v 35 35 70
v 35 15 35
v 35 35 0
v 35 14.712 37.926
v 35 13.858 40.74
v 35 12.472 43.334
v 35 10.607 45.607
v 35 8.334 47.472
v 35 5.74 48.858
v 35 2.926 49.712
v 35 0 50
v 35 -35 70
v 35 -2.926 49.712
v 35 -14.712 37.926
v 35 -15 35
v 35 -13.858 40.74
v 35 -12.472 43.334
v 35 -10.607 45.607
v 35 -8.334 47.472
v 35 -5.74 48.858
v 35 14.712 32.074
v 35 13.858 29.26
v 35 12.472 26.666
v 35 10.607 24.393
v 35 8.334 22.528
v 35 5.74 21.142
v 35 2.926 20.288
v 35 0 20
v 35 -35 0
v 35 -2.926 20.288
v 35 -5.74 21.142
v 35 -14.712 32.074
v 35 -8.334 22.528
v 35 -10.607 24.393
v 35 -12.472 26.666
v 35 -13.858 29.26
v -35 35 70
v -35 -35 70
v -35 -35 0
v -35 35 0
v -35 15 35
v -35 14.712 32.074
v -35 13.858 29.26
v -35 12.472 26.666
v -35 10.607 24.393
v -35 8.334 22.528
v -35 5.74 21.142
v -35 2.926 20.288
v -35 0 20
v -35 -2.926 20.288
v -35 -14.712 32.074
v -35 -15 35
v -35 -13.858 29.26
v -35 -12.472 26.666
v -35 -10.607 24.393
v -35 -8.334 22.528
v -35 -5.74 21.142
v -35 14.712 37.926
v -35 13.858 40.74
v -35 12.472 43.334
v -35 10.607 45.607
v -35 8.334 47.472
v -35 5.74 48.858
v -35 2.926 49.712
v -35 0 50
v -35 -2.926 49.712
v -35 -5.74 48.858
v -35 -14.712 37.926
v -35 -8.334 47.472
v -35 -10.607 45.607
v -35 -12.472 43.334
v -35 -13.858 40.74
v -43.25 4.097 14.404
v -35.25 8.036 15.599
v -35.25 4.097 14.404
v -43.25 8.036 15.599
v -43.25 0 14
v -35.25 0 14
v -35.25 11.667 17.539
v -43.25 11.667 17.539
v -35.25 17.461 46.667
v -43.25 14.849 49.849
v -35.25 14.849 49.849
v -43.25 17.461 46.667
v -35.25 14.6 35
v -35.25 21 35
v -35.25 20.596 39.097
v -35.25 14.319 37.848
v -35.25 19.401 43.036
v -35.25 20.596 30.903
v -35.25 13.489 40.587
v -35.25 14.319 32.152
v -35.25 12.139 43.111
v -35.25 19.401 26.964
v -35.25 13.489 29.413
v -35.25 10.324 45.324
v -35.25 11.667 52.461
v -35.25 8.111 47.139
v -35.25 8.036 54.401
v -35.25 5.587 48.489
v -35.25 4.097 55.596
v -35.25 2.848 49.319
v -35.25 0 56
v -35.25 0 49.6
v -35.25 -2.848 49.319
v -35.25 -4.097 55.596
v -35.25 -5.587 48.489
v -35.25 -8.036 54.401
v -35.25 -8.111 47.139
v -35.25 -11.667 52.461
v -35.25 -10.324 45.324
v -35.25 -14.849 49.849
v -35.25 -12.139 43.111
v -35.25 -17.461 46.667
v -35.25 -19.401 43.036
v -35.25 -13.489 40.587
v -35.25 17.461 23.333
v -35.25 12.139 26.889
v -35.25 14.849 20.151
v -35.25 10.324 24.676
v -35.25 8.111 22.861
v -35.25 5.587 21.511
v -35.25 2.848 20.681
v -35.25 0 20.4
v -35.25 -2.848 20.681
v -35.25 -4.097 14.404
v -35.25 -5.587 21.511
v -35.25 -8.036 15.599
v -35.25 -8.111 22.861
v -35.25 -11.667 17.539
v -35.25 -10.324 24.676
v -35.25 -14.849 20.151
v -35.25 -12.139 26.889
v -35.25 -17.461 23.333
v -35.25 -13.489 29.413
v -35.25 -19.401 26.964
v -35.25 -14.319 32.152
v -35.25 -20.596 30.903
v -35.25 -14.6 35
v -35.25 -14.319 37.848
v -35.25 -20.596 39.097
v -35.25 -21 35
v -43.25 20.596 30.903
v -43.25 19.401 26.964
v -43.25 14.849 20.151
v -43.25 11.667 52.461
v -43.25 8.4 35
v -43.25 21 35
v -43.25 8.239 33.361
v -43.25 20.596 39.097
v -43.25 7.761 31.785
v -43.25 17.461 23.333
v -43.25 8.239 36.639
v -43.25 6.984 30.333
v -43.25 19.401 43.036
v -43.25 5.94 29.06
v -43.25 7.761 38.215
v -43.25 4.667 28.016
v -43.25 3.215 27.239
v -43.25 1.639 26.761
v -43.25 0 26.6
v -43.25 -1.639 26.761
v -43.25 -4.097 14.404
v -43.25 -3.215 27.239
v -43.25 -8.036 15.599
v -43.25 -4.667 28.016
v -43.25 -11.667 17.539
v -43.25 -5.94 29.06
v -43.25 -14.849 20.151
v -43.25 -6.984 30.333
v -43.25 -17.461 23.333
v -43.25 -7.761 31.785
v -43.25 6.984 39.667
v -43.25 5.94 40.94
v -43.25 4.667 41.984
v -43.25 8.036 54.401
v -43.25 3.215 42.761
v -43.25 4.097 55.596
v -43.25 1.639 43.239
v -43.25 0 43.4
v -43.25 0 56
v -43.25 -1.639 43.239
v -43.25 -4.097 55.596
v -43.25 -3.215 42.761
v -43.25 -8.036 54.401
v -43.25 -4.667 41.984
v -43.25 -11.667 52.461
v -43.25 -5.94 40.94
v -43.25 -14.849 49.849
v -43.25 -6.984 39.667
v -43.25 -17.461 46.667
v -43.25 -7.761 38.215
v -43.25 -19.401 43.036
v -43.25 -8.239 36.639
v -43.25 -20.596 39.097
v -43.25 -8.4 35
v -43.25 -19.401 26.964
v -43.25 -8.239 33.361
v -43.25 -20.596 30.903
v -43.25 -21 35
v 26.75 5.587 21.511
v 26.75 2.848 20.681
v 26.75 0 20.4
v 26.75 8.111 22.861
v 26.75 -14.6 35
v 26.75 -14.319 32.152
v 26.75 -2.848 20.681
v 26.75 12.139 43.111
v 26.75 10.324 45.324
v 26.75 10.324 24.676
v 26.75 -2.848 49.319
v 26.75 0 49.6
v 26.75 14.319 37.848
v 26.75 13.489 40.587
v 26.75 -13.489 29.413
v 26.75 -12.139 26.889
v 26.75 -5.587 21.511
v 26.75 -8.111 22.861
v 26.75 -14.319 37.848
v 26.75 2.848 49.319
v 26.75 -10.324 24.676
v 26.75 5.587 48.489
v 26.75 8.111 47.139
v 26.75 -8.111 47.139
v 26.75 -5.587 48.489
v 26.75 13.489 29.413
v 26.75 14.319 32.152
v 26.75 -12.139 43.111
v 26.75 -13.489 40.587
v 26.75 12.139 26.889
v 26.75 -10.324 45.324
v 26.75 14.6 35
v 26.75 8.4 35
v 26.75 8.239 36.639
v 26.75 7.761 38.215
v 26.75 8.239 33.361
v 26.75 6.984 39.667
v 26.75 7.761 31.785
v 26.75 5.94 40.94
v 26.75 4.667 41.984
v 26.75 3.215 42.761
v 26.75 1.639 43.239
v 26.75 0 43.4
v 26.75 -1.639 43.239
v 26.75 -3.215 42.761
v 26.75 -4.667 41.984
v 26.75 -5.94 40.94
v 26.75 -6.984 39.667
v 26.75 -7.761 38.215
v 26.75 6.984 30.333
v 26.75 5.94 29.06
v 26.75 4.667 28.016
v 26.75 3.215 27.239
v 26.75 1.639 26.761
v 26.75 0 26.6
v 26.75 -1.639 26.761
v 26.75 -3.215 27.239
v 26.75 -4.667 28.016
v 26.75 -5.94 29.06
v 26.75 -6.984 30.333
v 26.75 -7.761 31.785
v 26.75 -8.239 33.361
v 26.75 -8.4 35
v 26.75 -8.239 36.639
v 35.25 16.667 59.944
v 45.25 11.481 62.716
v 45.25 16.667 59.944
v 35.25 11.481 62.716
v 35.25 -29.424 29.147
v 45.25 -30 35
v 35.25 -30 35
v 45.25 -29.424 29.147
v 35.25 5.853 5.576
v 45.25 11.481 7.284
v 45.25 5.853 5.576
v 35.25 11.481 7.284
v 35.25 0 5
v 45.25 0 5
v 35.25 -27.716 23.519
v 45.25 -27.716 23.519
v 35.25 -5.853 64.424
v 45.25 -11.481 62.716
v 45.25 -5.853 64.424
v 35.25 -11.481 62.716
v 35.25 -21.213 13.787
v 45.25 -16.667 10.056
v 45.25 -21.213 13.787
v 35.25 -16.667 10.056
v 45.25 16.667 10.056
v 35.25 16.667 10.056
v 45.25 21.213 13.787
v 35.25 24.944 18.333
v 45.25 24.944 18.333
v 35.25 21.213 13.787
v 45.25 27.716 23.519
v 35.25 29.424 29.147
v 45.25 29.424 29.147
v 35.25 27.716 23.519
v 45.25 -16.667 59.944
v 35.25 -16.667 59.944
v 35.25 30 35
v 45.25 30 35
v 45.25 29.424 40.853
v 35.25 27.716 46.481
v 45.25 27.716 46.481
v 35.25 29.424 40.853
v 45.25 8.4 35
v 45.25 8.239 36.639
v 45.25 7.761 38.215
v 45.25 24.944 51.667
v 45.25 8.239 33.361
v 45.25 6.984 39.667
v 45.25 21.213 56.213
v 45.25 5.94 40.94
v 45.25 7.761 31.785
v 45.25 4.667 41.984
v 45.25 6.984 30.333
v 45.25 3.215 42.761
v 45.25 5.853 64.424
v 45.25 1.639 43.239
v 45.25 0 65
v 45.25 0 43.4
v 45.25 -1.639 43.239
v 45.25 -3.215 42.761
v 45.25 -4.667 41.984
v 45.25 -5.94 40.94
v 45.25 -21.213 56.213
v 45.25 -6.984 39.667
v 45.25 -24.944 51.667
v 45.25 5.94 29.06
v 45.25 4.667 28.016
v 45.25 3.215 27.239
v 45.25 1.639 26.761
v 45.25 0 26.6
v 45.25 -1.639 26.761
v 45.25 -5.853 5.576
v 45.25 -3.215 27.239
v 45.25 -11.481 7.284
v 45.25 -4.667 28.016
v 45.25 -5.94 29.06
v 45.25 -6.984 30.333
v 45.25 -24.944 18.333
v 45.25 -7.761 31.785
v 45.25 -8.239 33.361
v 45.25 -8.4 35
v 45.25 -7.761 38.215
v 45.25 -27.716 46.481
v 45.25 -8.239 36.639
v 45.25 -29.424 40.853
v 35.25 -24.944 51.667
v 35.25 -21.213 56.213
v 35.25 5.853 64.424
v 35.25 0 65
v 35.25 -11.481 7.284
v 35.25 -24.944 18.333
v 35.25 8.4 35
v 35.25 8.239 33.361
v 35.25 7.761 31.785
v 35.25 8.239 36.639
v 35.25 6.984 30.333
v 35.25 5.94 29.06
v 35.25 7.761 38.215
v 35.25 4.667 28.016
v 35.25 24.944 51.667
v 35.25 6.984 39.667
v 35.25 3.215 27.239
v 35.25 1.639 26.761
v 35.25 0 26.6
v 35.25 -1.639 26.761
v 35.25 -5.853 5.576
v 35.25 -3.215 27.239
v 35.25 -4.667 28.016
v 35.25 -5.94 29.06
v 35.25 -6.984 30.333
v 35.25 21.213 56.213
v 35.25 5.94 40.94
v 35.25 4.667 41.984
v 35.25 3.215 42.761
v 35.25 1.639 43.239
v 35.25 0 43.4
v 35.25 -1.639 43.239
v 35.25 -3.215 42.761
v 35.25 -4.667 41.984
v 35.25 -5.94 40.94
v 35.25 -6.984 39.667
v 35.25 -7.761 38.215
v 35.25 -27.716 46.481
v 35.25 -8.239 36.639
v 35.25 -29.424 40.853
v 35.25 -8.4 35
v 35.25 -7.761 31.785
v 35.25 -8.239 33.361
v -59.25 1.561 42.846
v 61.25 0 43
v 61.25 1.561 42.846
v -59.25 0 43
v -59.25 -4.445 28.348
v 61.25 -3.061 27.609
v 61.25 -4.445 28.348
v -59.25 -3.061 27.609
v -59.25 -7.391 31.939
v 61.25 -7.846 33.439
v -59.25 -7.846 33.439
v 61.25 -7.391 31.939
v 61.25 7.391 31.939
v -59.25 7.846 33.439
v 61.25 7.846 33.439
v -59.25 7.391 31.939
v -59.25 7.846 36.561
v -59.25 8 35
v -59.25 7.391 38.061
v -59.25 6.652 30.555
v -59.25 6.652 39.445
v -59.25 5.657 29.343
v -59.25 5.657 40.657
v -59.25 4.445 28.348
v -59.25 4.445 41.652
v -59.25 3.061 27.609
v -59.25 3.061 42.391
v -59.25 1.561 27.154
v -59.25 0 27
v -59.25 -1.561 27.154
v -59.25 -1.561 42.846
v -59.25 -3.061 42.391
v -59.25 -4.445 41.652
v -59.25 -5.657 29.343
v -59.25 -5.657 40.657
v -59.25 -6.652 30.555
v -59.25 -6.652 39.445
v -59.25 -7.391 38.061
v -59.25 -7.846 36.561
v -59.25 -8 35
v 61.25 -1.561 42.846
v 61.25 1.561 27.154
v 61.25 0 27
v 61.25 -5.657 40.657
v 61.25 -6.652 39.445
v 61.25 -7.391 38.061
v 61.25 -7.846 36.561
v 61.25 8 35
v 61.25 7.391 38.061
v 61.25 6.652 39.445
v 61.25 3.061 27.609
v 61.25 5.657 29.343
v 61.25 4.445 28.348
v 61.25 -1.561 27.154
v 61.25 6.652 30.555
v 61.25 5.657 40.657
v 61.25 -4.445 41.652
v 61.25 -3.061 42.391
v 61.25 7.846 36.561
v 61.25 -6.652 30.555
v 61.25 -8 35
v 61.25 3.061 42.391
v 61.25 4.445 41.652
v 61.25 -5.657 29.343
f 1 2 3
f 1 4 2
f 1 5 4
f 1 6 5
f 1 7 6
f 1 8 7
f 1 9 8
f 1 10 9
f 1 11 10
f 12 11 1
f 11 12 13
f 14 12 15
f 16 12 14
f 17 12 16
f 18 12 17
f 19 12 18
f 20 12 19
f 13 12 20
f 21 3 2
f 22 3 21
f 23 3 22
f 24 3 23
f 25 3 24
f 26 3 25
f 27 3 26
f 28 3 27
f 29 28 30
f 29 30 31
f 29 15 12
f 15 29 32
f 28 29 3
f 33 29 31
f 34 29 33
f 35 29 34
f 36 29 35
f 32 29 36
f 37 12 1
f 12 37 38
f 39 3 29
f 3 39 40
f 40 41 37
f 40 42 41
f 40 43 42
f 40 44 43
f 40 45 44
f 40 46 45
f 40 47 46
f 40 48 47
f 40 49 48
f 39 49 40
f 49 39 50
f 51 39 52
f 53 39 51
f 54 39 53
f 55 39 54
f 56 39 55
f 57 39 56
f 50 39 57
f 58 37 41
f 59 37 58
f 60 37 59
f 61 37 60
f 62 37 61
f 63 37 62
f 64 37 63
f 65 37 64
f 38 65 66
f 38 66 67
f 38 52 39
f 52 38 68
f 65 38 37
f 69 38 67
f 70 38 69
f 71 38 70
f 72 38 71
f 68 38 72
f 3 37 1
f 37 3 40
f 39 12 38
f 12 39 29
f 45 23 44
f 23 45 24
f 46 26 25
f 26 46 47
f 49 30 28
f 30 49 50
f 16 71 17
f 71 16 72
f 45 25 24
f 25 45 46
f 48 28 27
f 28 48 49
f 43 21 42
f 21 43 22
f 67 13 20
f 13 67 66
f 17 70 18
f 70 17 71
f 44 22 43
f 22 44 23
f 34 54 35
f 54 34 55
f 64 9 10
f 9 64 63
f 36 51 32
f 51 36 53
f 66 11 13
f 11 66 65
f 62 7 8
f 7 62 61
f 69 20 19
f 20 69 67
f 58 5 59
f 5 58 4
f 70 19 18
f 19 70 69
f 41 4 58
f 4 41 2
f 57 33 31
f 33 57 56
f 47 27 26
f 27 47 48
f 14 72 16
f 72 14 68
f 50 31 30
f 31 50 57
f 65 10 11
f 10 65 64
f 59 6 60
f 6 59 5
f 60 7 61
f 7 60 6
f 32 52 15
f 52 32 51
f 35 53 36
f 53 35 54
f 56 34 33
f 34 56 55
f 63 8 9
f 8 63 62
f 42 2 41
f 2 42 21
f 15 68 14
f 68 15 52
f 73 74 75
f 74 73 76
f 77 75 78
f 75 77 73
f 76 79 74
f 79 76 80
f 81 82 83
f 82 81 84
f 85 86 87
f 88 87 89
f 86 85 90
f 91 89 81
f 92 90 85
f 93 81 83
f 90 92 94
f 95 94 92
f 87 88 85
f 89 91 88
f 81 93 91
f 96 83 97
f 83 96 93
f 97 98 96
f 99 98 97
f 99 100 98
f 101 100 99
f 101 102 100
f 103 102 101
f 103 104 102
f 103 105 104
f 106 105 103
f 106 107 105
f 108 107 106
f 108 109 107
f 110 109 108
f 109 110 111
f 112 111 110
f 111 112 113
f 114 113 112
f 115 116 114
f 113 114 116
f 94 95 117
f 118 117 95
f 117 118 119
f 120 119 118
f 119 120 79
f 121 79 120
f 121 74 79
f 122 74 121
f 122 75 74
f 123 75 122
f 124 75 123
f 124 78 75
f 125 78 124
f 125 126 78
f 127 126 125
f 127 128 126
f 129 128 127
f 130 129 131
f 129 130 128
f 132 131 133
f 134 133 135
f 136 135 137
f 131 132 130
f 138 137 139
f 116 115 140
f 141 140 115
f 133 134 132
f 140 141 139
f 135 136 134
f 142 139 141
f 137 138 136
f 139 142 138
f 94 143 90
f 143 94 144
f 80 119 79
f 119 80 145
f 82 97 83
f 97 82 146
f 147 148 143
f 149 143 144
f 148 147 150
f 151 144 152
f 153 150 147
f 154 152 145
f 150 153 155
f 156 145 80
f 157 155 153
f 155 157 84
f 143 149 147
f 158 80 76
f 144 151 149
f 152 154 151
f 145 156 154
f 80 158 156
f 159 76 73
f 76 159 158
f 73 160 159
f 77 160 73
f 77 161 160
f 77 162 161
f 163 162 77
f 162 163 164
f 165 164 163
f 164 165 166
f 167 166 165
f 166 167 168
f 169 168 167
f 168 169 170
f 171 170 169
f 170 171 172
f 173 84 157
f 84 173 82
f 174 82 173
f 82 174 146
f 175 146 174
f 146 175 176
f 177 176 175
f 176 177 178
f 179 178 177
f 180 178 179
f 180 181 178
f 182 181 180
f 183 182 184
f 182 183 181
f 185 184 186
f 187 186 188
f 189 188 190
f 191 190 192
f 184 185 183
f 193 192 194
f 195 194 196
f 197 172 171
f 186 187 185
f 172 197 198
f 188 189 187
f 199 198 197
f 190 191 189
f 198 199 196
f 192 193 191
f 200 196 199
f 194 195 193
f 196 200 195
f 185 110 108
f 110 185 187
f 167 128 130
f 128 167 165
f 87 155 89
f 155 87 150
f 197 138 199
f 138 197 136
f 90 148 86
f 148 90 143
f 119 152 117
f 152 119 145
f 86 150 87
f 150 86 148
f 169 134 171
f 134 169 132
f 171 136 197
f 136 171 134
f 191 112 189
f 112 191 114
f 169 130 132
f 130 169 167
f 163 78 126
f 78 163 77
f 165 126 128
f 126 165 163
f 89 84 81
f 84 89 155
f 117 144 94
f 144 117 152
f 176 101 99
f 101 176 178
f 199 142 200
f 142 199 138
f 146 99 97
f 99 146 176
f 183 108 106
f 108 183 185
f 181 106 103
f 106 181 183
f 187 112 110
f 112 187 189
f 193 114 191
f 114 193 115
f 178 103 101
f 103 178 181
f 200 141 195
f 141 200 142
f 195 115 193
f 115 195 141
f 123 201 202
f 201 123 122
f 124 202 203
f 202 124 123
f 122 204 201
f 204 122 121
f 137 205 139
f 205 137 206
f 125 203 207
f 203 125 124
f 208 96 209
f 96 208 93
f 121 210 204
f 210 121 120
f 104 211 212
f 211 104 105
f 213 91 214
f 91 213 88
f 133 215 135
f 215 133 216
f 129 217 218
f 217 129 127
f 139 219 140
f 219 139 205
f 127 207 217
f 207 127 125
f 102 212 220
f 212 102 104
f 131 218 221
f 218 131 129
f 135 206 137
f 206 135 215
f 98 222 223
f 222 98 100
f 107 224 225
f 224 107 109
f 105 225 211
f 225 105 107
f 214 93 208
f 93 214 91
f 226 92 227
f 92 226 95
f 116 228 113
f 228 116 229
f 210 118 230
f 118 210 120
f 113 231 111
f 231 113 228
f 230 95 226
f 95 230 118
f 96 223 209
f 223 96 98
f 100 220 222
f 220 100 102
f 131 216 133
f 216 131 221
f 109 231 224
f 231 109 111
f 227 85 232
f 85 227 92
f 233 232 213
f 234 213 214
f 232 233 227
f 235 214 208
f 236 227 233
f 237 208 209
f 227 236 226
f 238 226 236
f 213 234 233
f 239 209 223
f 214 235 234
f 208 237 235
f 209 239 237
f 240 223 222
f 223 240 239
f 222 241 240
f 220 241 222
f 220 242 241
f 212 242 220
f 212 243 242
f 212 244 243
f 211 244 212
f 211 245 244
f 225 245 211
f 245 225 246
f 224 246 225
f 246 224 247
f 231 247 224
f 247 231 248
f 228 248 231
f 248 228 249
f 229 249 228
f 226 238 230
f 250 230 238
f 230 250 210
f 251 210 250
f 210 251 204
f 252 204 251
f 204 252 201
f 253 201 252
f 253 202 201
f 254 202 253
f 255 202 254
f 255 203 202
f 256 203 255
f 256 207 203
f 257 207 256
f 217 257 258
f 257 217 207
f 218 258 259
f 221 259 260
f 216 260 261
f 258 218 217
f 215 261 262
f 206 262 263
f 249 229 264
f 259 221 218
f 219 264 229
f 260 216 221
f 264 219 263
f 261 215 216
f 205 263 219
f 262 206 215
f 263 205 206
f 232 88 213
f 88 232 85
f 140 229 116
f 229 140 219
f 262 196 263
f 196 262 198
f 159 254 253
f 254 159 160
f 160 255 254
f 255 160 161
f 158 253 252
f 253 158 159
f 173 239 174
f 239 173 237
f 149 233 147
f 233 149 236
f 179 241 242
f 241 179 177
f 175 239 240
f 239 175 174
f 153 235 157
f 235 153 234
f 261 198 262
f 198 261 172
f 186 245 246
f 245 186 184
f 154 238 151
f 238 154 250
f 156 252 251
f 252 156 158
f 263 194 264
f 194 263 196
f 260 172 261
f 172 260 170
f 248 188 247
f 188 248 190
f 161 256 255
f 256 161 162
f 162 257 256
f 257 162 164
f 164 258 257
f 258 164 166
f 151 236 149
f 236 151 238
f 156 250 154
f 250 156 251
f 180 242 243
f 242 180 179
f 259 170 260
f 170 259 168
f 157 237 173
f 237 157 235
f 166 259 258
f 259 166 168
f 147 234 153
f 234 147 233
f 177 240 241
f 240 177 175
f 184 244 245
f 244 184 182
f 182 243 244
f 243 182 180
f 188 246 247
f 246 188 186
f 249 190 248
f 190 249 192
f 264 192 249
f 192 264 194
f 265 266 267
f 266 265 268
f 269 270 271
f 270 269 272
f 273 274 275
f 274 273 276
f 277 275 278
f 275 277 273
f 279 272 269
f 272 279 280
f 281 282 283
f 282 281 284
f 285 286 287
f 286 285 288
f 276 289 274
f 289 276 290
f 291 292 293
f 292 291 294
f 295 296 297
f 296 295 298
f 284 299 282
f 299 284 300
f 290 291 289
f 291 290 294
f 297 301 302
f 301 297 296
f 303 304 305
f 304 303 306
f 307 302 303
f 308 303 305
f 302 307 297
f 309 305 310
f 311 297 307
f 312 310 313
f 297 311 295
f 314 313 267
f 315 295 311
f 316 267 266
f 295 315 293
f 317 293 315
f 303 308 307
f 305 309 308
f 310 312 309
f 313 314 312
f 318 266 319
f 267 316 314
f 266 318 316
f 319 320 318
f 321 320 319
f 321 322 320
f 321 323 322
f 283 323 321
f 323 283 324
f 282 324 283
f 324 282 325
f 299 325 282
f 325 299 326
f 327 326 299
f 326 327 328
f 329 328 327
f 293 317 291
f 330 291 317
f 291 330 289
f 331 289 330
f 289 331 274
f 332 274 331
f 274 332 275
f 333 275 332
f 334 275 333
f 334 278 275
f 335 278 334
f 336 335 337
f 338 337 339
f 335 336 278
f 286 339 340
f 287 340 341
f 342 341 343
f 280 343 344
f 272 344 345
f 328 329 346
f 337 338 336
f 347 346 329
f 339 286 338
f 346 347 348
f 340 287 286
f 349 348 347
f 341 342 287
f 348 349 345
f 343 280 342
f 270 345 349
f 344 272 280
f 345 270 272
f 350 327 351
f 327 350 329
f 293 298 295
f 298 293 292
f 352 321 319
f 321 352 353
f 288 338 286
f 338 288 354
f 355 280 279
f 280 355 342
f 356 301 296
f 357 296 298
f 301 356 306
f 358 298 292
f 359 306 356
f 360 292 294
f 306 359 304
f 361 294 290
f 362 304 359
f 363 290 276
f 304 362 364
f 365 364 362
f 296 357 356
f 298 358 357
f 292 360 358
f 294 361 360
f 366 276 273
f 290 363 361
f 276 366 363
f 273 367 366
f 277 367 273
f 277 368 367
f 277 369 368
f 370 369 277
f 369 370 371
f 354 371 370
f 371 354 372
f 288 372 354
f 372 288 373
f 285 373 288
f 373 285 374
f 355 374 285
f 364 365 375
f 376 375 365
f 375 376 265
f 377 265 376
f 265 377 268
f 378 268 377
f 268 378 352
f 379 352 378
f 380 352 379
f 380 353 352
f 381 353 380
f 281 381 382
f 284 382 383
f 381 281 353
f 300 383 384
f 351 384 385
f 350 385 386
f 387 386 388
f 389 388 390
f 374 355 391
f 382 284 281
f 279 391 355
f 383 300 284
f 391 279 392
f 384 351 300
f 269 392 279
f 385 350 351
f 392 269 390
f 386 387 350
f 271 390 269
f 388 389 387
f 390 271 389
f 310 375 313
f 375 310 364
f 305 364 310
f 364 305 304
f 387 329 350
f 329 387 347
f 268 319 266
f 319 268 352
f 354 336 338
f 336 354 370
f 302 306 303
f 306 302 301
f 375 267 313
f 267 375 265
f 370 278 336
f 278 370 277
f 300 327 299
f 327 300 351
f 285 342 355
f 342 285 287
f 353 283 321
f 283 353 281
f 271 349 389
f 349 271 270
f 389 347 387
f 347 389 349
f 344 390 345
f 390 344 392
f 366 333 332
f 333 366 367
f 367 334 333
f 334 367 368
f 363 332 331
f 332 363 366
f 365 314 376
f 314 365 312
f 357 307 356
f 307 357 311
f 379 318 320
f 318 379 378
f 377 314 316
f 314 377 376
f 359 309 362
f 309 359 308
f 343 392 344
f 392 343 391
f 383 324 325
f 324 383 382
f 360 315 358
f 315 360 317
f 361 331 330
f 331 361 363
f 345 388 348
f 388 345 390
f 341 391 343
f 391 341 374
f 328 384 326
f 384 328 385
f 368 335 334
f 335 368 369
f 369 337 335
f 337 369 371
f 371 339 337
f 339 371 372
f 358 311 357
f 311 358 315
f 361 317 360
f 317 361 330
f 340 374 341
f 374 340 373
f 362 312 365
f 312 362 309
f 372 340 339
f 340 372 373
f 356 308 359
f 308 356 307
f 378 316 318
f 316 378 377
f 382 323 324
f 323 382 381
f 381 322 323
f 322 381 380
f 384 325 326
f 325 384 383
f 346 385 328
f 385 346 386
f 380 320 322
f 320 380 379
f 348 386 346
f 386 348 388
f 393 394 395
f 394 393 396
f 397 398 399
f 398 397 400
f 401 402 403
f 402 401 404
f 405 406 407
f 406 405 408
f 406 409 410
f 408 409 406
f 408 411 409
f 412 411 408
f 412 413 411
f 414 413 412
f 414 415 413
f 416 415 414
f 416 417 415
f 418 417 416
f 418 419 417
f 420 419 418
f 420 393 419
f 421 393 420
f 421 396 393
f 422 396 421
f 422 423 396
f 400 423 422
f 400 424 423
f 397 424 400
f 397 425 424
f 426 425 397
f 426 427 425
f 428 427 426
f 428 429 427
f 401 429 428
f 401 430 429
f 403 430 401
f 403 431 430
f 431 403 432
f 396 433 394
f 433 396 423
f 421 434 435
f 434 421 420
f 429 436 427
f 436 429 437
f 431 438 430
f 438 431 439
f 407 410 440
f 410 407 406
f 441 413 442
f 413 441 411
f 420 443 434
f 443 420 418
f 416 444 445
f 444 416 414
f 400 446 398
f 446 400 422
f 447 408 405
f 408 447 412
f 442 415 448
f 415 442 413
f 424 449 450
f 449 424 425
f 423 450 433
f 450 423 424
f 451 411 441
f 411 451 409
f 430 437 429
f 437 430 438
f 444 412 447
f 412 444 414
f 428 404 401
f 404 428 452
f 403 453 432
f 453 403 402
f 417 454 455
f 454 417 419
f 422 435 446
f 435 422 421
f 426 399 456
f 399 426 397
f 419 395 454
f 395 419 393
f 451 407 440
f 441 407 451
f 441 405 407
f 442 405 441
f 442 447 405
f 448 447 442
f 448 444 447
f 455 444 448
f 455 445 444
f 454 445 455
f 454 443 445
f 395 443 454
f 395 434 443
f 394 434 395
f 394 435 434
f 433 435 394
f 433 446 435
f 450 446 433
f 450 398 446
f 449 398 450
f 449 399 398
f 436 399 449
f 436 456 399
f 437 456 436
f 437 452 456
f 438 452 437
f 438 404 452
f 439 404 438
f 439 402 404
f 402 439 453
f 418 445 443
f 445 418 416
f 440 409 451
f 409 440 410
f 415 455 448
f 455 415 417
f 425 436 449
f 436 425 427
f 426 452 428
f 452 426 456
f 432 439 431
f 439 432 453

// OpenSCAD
$fn = 32;

// ------------------------------------------------------------------------
// Bushed housing: 70 x 70 x 70 mm housing, bushing d29.2
// Every part is its own module, assembly() places them once.
// ------------------------------------------------------------------------

// --- part 1 ---
module housing() {
  difference() {
    translate([-35, -35, 0]) cube([70, 70, 70]);
    translate([0, 0, 35]) rotate([0, 90, 0]) cylinder(h = 72, d = 30, center = true);
  }
}

// --- part 2 ---
module bushing() {
  difference() {
    union() {
      cylinder(h = 8, d = 42);
      translate([0, 0, 8]) cylinder(h = 62, d = 29.2);
    }
    translate([0, 0, -1]) cylinder(h = 72, d = 16.8);
  }
}

// --- part 3 ---
module shaft() {
  translate([0, 0, -60.25]) cylinder(h = 120.5, d = 16);
}

// --- part 4 ---
module cover() {
  difference() {
    cylinder(h = 10, d = 60);
    translate([0, 0, -1]) cylinder(h = 12, d = 16.8);
  }
}

// --- assembly ---
module assembly() {
  translate([0, 0, 0]) rotate([0, 0, 0]) housing();
  translate([-43.25, 0, 35]) rotate([0, 90, 0]) bushing();
  translate([1, 0, 35]) rotate([0, 90, 0]) shaft();
  translate([35.25, 0, 35]) rotate([0, 90, 0]) cover();
}

assembly();
